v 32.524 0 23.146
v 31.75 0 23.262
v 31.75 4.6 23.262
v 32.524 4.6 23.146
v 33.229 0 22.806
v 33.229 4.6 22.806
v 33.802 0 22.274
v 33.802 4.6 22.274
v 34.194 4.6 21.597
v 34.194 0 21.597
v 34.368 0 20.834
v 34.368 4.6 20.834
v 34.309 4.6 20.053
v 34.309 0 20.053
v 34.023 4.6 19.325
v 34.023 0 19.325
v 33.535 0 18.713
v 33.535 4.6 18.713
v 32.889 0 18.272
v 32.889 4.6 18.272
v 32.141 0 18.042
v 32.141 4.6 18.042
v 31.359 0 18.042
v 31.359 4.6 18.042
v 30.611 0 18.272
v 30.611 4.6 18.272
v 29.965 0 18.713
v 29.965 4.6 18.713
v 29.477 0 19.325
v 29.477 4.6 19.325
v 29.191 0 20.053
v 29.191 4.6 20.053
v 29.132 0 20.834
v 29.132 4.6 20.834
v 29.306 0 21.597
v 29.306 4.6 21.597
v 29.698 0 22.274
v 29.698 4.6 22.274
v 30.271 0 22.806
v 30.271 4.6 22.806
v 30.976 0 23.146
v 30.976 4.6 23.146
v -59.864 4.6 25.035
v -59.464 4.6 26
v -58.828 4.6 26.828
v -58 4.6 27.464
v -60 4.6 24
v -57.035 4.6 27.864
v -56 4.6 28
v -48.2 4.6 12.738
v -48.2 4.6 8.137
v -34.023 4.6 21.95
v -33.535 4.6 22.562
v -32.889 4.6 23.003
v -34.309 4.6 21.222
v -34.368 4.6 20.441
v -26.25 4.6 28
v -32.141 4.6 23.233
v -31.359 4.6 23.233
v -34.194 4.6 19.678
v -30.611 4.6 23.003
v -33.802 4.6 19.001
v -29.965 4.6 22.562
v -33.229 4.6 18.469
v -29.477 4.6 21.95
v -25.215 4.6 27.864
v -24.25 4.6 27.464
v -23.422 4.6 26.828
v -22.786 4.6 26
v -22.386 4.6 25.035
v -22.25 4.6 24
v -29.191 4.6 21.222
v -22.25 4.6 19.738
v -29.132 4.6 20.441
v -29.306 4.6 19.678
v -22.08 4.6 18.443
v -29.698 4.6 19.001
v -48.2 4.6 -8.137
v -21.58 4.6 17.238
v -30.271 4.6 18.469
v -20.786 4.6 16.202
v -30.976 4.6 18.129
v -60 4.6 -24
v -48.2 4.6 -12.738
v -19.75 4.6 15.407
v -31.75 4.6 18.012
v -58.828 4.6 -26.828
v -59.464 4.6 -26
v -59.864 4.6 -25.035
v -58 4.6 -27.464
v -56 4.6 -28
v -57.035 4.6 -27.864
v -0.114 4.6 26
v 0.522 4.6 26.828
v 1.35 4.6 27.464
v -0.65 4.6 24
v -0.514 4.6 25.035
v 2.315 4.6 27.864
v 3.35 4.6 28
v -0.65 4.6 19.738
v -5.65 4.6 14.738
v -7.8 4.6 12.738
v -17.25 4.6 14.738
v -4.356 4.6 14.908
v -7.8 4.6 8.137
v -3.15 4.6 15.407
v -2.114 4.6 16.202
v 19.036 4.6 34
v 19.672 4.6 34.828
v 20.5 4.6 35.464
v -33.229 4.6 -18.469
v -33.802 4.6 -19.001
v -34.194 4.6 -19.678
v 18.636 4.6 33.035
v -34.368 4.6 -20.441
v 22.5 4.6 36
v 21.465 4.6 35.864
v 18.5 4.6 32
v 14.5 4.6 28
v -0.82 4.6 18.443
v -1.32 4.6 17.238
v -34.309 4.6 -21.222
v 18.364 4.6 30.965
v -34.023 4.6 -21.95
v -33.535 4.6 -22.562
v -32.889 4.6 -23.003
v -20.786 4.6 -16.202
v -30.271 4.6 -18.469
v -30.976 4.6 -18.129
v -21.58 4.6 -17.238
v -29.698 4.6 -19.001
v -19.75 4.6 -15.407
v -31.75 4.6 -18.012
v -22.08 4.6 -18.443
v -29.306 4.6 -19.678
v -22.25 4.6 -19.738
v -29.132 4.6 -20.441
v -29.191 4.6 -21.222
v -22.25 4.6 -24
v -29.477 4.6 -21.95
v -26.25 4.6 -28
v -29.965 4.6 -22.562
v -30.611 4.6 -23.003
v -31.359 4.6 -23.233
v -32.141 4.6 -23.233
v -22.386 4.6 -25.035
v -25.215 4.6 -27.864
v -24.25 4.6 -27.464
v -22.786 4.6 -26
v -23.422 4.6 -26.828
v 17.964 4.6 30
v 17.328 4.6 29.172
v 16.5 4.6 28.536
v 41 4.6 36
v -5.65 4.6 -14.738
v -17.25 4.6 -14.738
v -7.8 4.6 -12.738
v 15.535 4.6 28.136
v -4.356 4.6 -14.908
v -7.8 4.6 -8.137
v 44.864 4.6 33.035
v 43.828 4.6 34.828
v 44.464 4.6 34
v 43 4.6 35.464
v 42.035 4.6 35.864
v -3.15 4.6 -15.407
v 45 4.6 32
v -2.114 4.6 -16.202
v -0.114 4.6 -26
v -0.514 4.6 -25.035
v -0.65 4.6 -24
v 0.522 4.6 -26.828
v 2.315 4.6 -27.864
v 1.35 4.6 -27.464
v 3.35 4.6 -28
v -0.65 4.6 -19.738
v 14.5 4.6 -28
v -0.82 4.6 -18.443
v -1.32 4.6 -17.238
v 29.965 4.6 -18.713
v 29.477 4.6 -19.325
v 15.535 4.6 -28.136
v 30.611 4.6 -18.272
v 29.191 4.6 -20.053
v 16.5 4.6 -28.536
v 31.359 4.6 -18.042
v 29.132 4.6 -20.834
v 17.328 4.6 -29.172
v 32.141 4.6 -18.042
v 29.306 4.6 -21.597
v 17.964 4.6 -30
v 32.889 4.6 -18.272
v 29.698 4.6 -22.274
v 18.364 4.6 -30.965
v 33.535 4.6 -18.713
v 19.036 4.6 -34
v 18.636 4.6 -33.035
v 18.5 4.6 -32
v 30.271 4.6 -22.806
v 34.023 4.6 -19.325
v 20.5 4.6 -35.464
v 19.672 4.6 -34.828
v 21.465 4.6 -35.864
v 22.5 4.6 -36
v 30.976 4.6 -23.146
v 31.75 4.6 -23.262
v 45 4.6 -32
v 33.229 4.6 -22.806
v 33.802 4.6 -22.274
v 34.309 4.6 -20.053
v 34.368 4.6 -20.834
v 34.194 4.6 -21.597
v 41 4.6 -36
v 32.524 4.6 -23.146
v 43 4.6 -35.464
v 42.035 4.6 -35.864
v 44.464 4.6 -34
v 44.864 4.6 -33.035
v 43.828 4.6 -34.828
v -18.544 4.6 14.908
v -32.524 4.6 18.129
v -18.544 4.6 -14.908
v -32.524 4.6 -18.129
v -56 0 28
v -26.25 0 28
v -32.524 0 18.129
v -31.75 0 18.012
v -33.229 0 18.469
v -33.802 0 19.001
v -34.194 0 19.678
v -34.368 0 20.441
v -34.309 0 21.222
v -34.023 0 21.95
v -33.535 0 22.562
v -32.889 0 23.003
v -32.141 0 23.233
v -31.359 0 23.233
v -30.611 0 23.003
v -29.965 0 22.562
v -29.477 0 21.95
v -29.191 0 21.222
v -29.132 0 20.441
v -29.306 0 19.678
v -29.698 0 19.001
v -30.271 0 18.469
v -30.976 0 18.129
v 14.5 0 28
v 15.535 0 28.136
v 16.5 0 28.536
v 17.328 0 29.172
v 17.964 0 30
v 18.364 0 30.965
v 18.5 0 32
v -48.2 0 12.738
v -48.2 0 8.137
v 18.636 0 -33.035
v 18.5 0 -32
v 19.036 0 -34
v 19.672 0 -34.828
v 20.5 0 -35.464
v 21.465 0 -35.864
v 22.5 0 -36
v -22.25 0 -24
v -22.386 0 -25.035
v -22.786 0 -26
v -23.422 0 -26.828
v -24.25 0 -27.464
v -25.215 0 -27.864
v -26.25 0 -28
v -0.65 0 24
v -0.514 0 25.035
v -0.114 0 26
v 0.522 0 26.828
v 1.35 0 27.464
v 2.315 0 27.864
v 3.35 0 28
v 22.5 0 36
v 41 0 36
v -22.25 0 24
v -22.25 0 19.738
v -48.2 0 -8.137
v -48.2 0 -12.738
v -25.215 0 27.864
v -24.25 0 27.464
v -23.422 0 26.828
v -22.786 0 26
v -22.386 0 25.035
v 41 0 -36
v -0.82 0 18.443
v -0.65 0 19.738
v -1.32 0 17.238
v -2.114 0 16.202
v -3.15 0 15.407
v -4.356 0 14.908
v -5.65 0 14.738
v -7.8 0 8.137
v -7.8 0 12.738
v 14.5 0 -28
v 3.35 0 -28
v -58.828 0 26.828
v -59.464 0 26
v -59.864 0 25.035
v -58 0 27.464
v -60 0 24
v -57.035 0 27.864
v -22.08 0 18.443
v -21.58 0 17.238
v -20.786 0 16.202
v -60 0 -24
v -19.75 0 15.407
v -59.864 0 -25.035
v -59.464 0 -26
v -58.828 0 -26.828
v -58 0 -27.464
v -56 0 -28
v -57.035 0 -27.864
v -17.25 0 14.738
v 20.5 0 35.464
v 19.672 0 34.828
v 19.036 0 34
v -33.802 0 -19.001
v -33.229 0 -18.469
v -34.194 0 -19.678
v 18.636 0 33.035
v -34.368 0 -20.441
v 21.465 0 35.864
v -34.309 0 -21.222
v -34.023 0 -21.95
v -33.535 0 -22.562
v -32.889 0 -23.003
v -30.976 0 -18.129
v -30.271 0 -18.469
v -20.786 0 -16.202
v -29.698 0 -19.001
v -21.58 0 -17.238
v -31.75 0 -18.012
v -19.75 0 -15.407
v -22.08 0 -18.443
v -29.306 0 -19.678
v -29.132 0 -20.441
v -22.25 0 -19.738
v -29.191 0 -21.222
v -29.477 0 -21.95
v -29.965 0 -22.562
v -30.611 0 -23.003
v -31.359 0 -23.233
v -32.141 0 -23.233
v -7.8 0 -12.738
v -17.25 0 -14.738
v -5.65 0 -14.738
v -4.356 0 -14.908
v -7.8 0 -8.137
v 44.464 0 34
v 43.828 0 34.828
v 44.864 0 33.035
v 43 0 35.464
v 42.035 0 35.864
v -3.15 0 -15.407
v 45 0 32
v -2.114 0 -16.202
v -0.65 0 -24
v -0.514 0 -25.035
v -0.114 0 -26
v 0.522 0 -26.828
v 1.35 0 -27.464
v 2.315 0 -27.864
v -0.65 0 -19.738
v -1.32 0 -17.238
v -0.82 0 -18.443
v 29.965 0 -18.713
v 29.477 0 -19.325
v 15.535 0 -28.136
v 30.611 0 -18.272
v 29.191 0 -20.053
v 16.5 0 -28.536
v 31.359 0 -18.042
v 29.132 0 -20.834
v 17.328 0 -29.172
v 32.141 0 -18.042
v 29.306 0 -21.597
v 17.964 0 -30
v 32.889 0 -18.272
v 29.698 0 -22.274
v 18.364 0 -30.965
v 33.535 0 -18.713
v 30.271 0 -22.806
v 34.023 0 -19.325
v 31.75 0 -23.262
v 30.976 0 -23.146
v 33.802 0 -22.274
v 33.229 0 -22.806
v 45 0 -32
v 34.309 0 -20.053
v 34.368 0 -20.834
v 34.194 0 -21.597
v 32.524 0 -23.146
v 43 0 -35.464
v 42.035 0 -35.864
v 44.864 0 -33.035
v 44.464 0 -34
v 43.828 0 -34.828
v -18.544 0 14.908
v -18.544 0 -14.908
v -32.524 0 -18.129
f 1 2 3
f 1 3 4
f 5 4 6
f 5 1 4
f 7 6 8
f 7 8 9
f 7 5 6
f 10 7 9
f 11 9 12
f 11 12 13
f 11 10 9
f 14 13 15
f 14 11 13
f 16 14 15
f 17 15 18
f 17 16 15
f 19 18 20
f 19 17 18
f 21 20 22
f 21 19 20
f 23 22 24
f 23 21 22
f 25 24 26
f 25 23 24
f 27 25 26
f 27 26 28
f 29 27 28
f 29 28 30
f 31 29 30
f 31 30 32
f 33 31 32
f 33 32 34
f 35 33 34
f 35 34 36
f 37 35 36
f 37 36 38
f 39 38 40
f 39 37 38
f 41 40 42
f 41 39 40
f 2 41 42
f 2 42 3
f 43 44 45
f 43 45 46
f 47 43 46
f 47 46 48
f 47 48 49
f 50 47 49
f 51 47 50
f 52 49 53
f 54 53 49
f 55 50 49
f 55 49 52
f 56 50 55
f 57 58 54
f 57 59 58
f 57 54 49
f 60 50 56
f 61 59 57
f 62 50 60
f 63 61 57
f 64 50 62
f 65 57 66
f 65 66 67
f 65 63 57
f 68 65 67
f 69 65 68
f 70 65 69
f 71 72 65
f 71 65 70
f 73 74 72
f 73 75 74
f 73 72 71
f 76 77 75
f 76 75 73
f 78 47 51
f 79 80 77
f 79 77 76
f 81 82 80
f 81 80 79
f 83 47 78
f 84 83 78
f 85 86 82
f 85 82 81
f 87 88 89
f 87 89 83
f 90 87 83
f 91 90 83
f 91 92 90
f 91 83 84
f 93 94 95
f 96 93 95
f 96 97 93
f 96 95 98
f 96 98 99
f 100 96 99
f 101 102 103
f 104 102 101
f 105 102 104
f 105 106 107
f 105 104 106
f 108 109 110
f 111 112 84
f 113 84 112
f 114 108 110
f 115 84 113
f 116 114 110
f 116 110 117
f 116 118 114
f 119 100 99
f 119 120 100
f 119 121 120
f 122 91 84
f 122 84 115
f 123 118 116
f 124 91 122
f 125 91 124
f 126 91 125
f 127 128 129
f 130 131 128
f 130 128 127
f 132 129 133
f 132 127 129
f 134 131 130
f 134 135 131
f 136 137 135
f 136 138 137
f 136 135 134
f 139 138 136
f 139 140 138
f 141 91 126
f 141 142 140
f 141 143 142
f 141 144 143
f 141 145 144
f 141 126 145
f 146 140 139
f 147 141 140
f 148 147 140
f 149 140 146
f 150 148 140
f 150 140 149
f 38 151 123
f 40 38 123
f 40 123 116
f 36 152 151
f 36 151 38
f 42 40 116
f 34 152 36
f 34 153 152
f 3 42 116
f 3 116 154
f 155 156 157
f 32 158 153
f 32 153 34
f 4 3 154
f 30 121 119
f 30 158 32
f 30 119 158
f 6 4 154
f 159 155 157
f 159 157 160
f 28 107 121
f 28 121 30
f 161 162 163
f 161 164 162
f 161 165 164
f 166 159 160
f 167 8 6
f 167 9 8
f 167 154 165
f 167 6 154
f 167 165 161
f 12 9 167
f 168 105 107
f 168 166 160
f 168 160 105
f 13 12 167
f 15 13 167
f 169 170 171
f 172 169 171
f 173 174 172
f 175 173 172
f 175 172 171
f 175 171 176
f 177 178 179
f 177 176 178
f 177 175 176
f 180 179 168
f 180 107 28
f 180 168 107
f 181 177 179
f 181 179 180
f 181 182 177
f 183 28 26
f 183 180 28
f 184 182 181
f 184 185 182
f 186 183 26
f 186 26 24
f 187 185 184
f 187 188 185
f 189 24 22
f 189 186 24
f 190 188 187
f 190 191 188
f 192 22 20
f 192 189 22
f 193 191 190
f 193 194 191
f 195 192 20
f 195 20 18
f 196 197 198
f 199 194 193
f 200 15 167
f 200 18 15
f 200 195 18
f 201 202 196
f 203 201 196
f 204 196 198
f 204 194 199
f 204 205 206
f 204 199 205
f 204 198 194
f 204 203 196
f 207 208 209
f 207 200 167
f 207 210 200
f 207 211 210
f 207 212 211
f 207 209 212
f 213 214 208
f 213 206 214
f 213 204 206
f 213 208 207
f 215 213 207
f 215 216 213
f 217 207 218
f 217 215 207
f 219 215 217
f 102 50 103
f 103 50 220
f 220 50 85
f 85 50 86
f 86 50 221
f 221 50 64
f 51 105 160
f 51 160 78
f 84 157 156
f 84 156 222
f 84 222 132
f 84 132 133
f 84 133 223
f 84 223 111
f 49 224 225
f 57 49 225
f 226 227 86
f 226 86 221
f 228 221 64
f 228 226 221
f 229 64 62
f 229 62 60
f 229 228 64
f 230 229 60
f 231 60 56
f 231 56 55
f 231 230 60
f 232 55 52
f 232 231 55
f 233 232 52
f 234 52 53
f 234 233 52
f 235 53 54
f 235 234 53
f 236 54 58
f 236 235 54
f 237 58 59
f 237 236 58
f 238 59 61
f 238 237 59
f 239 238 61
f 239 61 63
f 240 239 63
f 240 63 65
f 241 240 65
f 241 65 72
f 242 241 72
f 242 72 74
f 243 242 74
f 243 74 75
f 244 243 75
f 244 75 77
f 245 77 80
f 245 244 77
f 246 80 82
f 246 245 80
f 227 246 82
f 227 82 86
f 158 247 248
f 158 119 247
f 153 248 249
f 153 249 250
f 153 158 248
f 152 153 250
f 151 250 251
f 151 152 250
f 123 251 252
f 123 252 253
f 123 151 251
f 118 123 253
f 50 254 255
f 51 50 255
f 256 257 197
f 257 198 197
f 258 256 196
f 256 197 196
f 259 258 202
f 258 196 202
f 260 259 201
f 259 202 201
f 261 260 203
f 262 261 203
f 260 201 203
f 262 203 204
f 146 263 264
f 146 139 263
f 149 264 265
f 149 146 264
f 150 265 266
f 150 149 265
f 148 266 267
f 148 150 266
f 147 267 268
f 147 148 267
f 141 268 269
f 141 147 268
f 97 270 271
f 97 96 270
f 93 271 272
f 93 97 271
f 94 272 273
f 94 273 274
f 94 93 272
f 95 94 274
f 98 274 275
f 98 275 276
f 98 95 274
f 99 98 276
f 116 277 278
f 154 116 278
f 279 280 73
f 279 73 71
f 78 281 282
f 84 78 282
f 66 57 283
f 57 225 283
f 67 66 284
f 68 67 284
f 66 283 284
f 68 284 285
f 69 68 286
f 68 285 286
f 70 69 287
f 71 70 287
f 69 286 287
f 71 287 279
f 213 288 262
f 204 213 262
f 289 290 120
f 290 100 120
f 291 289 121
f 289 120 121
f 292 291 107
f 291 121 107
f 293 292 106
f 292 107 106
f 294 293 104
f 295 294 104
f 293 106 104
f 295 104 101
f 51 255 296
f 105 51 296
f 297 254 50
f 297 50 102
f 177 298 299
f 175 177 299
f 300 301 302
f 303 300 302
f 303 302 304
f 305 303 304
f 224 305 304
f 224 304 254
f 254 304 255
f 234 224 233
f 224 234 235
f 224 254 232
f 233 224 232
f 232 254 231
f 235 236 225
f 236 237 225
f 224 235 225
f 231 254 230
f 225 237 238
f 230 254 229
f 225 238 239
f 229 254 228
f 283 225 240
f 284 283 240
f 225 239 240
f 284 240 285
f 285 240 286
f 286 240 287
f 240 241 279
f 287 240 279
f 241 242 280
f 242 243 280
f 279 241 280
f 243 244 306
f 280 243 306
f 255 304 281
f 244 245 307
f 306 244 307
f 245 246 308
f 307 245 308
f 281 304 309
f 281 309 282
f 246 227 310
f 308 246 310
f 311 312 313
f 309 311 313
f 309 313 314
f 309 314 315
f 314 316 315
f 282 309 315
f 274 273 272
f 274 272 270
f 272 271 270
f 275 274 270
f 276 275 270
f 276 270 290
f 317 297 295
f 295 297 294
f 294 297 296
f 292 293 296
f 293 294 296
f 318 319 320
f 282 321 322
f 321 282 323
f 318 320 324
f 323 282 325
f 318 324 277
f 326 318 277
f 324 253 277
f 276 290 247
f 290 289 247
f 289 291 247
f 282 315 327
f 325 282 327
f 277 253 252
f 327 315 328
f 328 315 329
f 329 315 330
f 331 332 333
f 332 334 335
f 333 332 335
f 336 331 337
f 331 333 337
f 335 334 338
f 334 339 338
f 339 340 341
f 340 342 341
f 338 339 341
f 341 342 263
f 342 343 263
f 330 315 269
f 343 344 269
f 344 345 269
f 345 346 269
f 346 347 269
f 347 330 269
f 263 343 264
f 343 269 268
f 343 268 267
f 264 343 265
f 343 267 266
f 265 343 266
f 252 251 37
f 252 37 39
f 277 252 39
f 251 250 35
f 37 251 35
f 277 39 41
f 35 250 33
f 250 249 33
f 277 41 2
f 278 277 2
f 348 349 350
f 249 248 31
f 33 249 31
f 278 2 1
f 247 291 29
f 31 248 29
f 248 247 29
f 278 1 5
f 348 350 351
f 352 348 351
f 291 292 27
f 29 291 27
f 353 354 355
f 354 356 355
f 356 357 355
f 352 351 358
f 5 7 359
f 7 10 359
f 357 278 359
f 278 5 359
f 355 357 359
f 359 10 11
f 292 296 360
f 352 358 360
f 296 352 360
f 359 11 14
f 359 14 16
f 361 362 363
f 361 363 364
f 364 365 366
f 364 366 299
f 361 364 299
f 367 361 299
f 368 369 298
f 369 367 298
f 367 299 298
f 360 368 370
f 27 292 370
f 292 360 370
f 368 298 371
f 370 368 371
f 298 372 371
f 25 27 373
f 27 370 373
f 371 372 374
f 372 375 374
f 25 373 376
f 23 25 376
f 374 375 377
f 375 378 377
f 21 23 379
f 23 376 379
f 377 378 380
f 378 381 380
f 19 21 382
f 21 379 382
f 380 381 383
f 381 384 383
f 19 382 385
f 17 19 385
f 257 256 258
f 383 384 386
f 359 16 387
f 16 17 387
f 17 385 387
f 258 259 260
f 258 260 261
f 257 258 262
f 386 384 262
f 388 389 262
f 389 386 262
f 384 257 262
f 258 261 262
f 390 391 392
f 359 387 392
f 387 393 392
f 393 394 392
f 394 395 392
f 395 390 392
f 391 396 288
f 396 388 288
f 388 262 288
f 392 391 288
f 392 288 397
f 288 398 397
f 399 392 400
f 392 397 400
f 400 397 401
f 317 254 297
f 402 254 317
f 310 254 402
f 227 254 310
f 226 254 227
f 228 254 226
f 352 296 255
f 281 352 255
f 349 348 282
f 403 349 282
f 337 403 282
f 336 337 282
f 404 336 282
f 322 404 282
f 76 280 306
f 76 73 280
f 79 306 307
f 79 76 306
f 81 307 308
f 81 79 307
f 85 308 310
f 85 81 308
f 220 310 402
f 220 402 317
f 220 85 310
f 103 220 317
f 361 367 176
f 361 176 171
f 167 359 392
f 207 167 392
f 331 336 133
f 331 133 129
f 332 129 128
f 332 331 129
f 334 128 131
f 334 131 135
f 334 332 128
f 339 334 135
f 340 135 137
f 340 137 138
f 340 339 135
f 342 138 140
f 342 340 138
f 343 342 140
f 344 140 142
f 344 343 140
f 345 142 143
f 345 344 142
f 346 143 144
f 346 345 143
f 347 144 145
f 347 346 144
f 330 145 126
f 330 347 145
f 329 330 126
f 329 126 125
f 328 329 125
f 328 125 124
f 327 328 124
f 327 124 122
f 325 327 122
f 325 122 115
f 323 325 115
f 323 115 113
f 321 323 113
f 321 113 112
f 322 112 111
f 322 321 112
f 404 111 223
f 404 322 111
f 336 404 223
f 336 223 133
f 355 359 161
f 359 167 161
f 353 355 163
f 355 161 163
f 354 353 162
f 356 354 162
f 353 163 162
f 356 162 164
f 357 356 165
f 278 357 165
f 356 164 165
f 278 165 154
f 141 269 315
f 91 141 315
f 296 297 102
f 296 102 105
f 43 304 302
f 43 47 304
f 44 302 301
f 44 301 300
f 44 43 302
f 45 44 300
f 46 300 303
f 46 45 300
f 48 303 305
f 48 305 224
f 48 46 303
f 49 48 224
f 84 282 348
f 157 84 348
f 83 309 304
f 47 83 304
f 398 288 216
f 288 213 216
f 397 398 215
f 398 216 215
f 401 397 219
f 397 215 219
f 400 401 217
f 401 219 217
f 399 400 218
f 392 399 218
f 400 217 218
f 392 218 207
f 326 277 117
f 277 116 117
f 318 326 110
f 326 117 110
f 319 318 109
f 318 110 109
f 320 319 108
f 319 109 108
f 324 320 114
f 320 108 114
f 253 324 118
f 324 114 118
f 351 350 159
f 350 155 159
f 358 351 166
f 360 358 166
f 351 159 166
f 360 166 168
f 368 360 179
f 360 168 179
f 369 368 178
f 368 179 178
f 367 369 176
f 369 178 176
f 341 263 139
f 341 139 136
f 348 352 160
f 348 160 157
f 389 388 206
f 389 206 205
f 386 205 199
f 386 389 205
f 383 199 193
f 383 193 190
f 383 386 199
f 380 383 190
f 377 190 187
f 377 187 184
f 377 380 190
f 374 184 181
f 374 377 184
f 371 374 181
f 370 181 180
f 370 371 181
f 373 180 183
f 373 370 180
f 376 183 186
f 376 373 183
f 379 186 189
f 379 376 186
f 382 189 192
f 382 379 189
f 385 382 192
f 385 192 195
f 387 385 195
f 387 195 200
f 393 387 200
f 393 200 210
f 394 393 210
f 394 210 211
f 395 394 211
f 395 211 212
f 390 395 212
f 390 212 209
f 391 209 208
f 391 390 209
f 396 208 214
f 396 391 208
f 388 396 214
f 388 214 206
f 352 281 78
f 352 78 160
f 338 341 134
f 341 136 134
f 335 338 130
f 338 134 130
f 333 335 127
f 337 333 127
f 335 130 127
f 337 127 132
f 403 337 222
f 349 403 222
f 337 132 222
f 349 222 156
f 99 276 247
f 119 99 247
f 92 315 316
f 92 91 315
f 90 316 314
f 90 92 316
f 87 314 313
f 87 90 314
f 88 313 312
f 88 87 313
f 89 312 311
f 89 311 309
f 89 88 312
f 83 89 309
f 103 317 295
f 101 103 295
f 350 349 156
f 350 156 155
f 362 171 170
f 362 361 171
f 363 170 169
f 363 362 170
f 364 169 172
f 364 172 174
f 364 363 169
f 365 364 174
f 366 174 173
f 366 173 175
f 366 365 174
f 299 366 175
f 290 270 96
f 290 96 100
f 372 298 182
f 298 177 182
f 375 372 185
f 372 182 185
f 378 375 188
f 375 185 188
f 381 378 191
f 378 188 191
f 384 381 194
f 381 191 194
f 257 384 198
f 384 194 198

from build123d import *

# Parameters (mm, degrees)
EXTRUDE_1_DEPTH     = 4.6
SKETCH_1_R          = 2.625
SKETCH_1_W          = 40.4
SKETCH_1_H          = 4.6
CUT_EXTRUDE_1_DEPTH = 4.6
FILLET_1_R          = 5
FILLET_2_R          = 4


with BuildPart() as part:
    # 草图3 → 凸台-拉伸1 (new body)
    with BuildSketch(Plane(origin=(0, 0, 0), x_dir=(1, 0, 0), z_dir=(0, 1, 0))):
        Polygon((-40, 28), (-60, 28), (-60, -28), (-40, -28), (18.5, -28), (18.5, -36), (45, -36), (45, -28), (45, 28), (45, 36), (18.5, 36), (18.5, 28), align=None)
    extrude(amount=EXTRUDE_1_DEPTH)

    # 草图1 → 切除-拉伸1 (cut)
    with BuildSketch(Plane(origin=(0, 0, 0), x_dir=(1, 0, 0), z_dir=(0, 1, 0))):
        with Locations(Location((-31.75, 20.6375, 0), (0, 0, 270))):
            Circle(SKETCH_1_R)
        with Locations(Location((31.75, 20.6375, 0), (0, 0, 90))):
            Circle(SKETCH_1_R)
        with Locations(Location((31.75, -20.6375, 0), (0, 0, 270))):
            Circle(SKETCH_1_R)
        with Locations(Location((-31.75, -20.6375, 0), (0, 0, 90))):
            Circle(SKETCH_1_R)
        with Locations((-28, -10.4375)):
            Rectangle(SKETCH_1_W, SKETCH_1_H)
        with Locations((-28, 10.4375)):
            Rectangle(SKETCH_1_W, SKETCH_1_H)
        Polygon((-22.25, -26.5375), (-22.25, -14.7375), (-0.65, -14.7375), (-0.65, -26.5375), (-0.65, -30.009482824), (-22.25, -30.009482824), align=None)
        Polygon((-22.25, 14.7375), (-0.65, 14.7375), (-0.65, 26.5375), (-0.65, 30.009482824), (-22.25, 30.009482824), (-22.25, 26.5375), align=None)
    extrude(amount=CUT_EXTRUDE_1_DEPTH, mode=Mode.SUBTRACT)

    # 圆角1
    fillet_1_edges = [part.edges().sort_by_distance(p)[0] for p in [
        (-22.25, 2.3, 14.7375),
        (-0.65, 2.3, 14.7375),
        (-0.65, 2.3, -14.7375),
        (-22.25, 2.3, -14.7375),
    ]]
    fillet(fillet_1_edges, radius=FILLET_1_R)

    # 圆角2
    fillet_2_edges = [part.edges().sort_by_distance(p)[0] for p in [
        (-0.65, 2.3, 28),
        (-22.25, 2.3, 28),
        (-0.65, 2.3, -28),
        (-22.25, 2.3, -28),
        (-60, 2.3, 28),
        (-60, 2.3, -28),
        (18.5, 2.3, -28),
        (18.5, 2.3, -36),
        (45, 2.3, -36),
        (45, 2.3, 36),
        (18.5, 2.3, 36),
        (18.5, 2.3, 28),
    ]]
    fillet(fillet_2_edges, radius=FILLET_2_R - 0.0001)  # a hair under: the kernel refuses the full size


solid = part.part
